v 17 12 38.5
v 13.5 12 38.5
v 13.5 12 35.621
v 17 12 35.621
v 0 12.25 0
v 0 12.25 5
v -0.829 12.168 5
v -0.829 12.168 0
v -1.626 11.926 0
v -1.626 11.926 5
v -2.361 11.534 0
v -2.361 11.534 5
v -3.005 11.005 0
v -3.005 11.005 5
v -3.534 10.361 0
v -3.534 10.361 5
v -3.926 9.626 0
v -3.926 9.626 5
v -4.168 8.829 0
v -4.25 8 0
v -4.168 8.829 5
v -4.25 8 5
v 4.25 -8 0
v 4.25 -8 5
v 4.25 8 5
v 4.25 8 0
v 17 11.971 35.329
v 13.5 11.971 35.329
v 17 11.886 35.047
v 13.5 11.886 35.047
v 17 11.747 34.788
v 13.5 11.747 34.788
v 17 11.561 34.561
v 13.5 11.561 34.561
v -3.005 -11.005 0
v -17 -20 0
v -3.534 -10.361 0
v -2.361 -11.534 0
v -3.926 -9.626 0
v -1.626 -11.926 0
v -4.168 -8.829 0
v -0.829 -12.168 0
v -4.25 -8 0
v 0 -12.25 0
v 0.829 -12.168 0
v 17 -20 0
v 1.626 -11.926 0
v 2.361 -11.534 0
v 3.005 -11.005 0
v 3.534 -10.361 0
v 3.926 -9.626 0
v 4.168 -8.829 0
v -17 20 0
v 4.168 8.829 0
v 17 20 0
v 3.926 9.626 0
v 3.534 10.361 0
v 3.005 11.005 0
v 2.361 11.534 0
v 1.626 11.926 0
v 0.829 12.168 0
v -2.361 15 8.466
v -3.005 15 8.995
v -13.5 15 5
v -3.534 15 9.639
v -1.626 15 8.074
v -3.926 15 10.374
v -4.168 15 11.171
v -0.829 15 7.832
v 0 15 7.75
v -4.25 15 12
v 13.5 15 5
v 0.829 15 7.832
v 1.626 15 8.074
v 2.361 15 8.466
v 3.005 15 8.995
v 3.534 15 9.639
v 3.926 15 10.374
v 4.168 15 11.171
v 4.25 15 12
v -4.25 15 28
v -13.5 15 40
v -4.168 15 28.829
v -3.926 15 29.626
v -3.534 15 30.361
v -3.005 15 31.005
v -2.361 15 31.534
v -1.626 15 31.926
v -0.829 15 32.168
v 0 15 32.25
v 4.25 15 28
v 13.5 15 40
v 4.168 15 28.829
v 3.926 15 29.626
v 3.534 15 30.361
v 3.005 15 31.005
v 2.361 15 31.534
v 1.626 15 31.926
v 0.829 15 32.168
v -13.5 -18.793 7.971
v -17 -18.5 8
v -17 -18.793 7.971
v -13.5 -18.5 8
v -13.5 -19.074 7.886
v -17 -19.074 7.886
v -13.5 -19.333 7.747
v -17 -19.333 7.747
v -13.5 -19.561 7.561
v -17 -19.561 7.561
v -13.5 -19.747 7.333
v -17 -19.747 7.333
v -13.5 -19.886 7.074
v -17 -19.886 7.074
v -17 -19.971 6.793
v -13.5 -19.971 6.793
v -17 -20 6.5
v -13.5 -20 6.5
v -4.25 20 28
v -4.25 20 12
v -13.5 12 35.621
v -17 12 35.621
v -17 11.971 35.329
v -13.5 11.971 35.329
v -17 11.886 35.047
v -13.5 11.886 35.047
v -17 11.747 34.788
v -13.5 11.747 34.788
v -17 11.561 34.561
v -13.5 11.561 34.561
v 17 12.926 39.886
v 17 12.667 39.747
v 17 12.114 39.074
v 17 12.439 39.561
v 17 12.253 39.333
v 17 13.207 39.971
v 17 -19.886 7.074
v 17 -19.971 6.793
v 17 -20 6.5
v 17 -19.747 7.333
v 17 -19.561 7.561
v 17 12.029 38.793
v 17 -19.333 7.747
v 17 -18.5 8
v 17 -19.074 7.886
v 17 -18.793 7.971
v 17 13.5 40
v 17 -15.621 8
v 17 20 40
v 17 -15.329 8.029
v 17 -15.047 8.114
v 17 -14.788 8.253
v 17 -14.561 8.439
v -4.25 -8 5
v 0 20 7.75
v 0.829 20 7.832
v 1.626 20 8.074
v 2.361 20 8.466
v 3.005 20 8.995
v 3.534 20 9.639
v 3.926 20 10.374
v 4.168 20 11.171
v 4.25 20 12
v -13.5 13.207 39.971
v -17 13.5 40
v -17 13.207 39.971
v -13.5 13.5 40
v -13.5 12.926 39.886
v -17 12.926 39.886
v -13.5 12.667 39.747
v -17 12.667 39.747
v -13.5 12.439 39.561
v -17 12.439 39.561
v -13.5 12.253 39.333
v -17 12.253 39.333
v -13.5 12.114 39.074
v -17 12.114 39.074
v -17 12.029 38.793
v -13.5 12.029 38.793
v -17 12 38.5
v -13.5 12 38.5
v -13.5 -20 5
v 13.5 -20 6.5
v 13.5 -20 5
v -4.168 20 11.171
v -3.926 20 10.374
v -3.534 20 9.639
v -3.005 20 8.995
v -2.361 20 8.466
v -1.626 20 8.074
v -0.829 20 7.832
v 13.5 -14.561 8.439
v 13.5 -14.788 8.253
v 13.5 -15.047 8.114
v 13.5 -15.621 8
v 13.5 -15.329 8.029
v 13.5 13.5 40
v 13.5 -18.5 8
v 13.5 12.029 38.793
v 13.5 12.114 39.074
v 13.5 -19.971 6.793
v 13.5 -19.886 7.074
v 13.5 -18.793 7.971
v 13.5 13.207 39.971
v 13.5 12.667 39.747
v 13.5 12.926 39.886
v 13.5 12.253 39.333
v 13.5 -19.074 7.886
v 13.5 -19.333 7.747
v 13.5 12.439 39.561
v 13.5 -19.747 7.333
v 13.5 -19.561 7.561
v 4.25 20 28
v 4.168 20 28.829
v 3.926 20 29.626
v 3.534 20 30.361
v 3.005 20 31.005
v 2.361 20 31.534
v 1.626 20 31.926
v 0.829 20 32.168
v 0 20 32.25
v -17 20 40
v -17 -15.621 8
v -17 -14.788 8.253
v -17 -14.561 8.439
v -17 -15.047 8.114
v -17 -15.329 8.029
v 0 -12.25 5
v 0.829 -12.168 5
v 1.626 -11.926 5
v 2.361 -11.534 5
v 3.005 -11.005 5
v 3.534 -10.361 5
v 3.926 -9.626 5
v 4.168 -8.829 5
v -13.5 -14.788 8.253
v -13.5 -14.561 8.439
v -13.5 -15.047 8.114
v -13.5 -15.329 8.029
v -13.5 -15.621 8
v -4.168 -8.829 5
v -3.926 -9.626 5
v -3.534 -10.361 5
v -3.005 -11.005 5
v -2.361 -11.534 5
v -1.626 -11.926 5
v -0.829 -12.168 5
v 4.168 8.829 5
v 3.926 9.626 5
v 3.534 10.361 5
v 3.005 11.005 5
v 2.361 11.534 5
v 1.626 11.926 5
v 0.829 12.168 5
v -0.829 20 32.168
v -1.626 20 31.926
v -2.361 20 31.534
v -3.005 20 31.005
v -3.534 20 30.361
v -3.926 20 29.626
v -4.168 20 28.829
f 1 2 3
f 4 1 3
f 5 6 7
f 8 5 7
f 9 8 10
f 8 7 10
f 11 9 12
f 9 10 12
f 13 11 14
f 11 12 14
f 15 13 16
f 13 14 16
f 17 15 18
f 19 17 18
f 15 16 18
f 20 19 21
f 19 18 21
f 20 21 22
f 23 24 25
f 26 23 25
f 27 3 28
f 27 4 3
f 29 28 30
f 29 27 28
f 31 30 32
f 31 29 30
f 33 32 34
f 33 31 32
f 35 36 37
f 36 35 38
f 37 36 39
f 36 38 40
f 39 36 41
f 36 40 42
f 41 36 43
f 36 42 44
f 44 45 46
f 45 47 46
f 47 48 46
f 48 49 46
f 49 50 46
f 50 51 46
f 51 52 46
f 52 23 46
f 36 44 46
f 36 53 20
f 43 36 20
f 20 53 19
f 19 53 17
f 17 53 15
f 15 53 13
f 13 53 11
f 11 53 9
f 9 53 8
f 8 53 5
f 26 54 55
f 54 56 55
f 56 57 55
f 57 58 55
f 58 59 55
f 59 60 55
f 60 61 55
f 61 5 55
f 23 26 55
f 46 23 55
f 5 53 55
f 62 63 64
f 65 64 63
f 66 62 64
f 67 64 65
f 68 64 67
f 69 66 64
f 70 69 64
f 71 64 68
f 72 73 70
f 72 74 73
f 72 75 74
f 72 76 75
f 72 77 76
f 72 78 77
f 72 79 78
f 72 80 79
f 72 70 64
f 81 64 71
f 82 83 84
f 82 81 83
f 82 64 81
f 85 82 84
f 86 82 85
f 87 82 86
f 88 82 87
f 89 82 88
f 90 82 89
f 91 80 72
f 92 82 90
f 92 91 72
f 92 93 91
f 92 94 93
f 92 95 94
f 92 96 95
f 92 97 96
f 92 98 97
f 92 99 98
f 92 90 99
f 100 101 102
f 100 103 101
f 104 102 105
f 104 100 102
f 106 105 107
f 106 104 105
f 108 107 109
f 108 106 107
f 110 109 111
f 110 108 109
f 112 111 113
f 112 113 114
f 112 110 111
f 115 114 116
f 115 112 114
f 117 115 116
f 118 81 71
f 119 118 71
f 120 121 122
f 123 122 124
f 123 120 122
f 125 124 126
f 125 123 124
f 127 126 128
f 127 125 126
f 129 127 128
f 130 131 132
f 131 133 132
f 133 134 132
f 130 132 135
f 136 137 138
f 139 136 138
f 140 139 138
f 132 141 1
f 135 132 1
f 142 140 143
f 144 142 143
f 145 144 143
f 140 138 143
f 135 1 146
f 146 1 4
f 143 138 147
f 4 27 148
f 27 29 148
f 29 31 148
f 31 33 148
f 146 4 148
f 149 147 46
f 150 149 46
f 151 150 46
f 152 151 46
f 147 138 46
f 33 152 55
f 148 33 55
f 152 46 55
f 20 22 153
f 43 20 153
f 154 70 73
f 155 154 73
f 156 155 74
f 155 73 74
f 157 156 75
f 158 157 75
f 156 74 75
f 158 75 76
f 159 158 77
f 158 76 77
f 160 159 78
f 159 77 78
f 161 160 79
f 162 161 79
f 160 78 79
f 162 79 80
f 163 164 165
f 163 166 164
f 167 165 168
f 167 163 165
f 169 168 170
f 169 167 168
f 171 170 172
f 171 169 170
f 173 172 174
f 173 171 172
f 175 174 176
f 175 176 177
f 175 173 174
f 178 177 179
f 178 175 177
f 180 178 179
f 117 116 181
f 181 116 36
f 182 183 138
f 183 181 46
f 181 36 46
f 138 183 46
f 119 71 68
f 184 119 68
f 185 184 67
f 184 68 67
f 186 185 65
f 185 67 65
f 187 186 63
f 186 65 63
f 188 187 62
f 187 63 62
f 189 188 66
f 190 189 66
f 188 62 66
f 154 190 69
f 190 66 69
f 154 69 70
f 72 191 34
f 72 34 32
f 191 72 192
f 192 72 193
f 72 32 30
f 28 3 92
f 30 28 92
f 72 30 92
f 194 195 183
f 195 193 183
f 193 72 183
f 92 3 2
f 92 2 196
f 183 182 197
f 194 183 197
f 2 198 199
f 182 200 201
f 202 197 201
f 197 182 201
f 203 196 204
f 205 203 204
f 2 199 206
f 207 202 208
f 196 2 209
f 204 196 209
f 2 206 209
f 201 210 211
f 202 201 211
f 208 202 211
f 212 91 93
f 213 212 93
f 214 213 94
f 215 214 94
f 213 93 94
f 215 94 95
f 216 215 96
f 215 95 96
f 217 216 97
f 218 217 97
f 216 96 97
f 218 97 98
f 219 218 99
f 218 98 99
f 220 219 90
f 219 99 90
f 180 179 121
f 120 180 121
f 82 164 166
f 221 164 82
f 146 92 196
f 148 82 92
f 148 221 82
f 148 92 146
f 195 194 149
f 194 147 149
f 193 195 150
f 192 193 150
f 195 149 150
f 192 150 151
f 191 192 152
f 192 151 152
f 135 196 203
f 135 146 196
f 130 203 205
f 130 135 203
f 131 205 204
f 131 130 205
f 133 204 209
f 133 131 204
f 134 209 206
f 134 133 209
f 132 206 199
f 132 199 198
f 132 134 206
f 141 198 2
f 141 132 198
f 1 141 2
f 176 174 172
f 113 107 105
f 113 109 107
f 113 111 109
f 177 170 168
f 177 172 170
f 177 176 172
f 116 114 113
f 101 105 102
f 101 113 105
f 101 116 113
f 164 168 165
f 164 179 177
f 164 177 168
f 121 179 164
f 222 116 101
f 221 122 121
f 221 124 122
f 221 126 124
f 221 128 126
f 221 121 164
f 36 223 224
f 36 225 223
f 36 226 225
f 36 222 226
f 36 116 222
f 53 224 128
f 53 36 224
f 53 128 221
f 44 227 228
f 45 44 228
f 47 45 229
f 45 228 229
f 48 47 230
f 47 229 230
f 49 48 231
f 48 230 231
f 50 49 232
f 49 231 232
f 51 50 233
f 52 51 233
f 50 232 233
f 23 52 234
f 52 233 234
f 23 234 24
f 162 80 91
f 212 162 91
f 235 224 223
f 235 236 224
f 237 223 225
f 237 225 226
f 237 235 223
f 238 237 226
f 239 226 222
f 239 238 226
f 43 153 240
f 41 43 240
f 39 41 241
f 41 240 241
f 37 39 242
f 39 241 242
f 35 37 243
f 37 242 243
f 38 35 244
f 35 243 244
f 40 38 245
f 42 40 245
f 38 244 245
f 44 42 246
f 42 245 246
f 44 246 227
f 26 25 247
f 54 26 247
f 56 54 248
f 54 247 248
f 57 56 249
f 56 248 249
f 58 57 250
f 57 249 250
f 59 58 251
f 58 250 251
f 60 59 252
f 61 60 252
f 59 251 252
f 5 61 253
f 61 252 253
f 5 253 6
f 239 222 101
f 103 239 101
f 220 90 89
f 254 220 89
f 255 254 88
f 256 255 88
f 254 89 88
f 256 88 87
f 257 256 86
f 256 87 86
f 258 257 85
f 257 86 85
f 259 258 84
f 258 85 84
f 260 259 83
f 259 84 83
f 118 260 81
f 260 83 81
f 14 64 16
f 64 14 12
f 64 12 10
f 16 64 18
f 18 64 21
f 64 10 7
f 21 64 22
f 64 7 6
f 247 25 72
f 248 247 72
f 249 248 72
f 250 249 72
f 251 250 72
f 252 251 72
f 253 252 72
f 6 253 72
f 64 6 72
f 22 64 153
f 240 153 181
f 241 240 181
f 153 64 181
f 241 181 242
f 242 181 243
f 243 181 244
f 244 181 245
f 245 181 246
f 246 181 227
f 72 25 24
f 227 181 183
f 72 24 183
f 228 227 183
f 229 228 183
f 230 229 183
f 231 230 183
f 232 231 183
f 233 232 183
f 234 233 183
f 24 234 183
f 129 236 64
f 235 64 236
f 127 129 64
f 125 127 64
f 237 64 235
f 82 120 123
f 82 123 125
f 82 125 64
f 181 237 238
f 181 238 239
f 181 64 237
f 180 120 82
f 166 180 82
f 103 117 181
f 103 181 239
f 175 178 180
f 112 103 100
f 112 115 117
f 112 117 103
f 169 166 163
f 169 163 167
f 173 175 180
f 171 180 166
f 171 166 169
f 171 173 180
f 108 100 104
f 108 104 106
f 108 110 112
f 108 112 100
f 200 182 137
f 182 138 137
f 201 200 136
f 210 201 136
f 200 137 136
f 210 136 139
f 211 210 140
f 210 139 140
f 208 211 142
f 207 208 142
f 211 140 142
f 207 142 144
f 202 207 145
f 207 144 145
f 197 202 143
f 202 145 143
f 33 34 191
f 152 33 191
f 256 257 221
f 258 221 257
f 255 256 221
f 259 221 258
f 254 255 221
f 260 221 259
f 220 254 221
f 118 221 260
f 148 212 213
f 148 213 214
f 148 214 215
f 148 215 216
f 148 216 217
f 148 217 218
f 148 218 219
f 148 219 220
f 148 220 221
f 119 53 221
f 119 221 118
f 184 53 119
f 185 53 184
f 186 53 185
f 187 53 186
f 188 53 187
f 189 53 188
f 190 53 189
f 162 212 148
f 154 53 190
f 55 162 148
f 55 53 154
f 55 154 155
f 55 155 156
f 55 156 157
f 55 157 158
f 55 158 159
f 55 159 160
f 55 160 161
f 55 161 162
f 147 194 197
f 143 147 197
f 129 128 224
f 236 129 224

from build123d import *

# Parameters (mm, degrees)
F0_W     = 34
F0_H     = 40
F1_DEPTH = 40
F2_W     = 27
F2_H     = 35
F3_DEPTH = 35
F5_DEPTH = 34.001
F7_DEPTH = 5.001
F9_DEPTH = 5.001
F10_R    = 1.5


with BuildPart() as f1:
    # F0 (on Top) → F1 (new body)
    with BuildSketch(Plane.XY):
        Rectangle(F0_W, F0_H)
    extrude(amount=F1_DEPTH)

    # F2 (on face) → F3 (cut)
    with BuildSketch(Plane.XZ.offset(20)):
        with Locations((0, 22.5)):
            Rectangle(F2_W, F2_H)
    extrude(amount=-F3_DEPTH, mode=Mode.SUBTRACT)

    # F4 (on face) → F5 (cut, through all)
    with BuildSketch(Plane(origin=(-17, 0, 0), x_dir=(0, -1, 0), z_dir=(-1, 0, 0))):
        Polygon((20, 40), (-12, 40), (-12, 35), (15, 8), (20, 8), align=None)
    extrude(amount=-F5_DEPTH, mode=Mode.SUBTRACT)

    # F6 (on face) → F7 (cut, through all)
    with BuildSketch(Plane.XY.offset(5)):
        with BuildLine():
            ThreePointArc((4.25, 8), (0, 3.75), (-4.25, 8))
            Line((-4.25, 8), (-4.25, -8))
            ThreePointArc((-4.25, -8), (0, -3.75), (4.25, -8))
            Line((4.25, -8), (4.25, 8))
        make_face()
        with BuildLine():
            ThreePointArc((4.25, 8), (3.00520382, 11.00520382), (0, 12.25))
            ThreePointArc((0, 12.25), (-3.00520382, 11.00520382), (-4.25, 8))
            ThreePointArc((-4.25, 8), (0, 3.75), (4.25, 8))
        make_face()
        with BuildLine():
            ThreePointArc((4.25, -8), (0, -3.75), (-4.25, -8))
            ThreePointArc((-4.25, -8), (-3.00520382, -11.00520382), (0, -12.25))
            ThreePointArc((0, -12.25), (3.00520382, -11.00520382), (4.25, -8))
        make_face()
    extrude(amount=-F7_DEPTH, mode=Mode.SUBTRACT)

    # F8 (on face) → F9 (cut, through all)
    with BuildSketch(Plane.XZ.offset(-15)):
        with BuildLine():
            ThreePointArc((4.25, 28), (0, 23.75), (-4.25, 28))
            Line((-4.25, 28), (-4.25, 12))
            ThreePointArc((-4.25, 12), (0, 16.25), (4.25, 12))
            Line((4.25, 12), (4.25, 28))
        make_face()
        with BuildLine():
            ThreePointArc((4.25, 28), (3.00520382, 31.00520382), (0, 32.25))
            ThreePointArc((0, 32.25), (-3.00520382, 31.00520382), (-4.25, 28))
            ThreePointArc((-4.25, 28), (0, 23.75), (4.25, 28))
        make_face()
        with BuildLine():
            ThreePointArc((4.25, 12), (0, 16.25), (-4.25, 12))
            ThreePointArc((-4.25, 12), (-3.00520382, 8.99479618), (0, 7.75))
            ThreePointArc((0, 7.75), (3.00520382, 8.99479618), (4.25, 12))
        make_face()
    extrude(amount=-F9_DEPTH, mode=Mode.SUBTRACT)

    # F10
    f10_edges = [f1.edges().sort_by_distance(p)[0] for p in [
        (-15.25, -15, 8),
        (15.25, -15, 8),
        (15.25, -20, 8),
        (-15.25, -20, 8),
        (15.25, 12, 35),
        (-15.25, 12, 35),
        (-15.25, 12, 40),
        (15.25, 12, 40),
    ]]
    fillet(f10_edges, radius=F10_R)


solid = f1.part
